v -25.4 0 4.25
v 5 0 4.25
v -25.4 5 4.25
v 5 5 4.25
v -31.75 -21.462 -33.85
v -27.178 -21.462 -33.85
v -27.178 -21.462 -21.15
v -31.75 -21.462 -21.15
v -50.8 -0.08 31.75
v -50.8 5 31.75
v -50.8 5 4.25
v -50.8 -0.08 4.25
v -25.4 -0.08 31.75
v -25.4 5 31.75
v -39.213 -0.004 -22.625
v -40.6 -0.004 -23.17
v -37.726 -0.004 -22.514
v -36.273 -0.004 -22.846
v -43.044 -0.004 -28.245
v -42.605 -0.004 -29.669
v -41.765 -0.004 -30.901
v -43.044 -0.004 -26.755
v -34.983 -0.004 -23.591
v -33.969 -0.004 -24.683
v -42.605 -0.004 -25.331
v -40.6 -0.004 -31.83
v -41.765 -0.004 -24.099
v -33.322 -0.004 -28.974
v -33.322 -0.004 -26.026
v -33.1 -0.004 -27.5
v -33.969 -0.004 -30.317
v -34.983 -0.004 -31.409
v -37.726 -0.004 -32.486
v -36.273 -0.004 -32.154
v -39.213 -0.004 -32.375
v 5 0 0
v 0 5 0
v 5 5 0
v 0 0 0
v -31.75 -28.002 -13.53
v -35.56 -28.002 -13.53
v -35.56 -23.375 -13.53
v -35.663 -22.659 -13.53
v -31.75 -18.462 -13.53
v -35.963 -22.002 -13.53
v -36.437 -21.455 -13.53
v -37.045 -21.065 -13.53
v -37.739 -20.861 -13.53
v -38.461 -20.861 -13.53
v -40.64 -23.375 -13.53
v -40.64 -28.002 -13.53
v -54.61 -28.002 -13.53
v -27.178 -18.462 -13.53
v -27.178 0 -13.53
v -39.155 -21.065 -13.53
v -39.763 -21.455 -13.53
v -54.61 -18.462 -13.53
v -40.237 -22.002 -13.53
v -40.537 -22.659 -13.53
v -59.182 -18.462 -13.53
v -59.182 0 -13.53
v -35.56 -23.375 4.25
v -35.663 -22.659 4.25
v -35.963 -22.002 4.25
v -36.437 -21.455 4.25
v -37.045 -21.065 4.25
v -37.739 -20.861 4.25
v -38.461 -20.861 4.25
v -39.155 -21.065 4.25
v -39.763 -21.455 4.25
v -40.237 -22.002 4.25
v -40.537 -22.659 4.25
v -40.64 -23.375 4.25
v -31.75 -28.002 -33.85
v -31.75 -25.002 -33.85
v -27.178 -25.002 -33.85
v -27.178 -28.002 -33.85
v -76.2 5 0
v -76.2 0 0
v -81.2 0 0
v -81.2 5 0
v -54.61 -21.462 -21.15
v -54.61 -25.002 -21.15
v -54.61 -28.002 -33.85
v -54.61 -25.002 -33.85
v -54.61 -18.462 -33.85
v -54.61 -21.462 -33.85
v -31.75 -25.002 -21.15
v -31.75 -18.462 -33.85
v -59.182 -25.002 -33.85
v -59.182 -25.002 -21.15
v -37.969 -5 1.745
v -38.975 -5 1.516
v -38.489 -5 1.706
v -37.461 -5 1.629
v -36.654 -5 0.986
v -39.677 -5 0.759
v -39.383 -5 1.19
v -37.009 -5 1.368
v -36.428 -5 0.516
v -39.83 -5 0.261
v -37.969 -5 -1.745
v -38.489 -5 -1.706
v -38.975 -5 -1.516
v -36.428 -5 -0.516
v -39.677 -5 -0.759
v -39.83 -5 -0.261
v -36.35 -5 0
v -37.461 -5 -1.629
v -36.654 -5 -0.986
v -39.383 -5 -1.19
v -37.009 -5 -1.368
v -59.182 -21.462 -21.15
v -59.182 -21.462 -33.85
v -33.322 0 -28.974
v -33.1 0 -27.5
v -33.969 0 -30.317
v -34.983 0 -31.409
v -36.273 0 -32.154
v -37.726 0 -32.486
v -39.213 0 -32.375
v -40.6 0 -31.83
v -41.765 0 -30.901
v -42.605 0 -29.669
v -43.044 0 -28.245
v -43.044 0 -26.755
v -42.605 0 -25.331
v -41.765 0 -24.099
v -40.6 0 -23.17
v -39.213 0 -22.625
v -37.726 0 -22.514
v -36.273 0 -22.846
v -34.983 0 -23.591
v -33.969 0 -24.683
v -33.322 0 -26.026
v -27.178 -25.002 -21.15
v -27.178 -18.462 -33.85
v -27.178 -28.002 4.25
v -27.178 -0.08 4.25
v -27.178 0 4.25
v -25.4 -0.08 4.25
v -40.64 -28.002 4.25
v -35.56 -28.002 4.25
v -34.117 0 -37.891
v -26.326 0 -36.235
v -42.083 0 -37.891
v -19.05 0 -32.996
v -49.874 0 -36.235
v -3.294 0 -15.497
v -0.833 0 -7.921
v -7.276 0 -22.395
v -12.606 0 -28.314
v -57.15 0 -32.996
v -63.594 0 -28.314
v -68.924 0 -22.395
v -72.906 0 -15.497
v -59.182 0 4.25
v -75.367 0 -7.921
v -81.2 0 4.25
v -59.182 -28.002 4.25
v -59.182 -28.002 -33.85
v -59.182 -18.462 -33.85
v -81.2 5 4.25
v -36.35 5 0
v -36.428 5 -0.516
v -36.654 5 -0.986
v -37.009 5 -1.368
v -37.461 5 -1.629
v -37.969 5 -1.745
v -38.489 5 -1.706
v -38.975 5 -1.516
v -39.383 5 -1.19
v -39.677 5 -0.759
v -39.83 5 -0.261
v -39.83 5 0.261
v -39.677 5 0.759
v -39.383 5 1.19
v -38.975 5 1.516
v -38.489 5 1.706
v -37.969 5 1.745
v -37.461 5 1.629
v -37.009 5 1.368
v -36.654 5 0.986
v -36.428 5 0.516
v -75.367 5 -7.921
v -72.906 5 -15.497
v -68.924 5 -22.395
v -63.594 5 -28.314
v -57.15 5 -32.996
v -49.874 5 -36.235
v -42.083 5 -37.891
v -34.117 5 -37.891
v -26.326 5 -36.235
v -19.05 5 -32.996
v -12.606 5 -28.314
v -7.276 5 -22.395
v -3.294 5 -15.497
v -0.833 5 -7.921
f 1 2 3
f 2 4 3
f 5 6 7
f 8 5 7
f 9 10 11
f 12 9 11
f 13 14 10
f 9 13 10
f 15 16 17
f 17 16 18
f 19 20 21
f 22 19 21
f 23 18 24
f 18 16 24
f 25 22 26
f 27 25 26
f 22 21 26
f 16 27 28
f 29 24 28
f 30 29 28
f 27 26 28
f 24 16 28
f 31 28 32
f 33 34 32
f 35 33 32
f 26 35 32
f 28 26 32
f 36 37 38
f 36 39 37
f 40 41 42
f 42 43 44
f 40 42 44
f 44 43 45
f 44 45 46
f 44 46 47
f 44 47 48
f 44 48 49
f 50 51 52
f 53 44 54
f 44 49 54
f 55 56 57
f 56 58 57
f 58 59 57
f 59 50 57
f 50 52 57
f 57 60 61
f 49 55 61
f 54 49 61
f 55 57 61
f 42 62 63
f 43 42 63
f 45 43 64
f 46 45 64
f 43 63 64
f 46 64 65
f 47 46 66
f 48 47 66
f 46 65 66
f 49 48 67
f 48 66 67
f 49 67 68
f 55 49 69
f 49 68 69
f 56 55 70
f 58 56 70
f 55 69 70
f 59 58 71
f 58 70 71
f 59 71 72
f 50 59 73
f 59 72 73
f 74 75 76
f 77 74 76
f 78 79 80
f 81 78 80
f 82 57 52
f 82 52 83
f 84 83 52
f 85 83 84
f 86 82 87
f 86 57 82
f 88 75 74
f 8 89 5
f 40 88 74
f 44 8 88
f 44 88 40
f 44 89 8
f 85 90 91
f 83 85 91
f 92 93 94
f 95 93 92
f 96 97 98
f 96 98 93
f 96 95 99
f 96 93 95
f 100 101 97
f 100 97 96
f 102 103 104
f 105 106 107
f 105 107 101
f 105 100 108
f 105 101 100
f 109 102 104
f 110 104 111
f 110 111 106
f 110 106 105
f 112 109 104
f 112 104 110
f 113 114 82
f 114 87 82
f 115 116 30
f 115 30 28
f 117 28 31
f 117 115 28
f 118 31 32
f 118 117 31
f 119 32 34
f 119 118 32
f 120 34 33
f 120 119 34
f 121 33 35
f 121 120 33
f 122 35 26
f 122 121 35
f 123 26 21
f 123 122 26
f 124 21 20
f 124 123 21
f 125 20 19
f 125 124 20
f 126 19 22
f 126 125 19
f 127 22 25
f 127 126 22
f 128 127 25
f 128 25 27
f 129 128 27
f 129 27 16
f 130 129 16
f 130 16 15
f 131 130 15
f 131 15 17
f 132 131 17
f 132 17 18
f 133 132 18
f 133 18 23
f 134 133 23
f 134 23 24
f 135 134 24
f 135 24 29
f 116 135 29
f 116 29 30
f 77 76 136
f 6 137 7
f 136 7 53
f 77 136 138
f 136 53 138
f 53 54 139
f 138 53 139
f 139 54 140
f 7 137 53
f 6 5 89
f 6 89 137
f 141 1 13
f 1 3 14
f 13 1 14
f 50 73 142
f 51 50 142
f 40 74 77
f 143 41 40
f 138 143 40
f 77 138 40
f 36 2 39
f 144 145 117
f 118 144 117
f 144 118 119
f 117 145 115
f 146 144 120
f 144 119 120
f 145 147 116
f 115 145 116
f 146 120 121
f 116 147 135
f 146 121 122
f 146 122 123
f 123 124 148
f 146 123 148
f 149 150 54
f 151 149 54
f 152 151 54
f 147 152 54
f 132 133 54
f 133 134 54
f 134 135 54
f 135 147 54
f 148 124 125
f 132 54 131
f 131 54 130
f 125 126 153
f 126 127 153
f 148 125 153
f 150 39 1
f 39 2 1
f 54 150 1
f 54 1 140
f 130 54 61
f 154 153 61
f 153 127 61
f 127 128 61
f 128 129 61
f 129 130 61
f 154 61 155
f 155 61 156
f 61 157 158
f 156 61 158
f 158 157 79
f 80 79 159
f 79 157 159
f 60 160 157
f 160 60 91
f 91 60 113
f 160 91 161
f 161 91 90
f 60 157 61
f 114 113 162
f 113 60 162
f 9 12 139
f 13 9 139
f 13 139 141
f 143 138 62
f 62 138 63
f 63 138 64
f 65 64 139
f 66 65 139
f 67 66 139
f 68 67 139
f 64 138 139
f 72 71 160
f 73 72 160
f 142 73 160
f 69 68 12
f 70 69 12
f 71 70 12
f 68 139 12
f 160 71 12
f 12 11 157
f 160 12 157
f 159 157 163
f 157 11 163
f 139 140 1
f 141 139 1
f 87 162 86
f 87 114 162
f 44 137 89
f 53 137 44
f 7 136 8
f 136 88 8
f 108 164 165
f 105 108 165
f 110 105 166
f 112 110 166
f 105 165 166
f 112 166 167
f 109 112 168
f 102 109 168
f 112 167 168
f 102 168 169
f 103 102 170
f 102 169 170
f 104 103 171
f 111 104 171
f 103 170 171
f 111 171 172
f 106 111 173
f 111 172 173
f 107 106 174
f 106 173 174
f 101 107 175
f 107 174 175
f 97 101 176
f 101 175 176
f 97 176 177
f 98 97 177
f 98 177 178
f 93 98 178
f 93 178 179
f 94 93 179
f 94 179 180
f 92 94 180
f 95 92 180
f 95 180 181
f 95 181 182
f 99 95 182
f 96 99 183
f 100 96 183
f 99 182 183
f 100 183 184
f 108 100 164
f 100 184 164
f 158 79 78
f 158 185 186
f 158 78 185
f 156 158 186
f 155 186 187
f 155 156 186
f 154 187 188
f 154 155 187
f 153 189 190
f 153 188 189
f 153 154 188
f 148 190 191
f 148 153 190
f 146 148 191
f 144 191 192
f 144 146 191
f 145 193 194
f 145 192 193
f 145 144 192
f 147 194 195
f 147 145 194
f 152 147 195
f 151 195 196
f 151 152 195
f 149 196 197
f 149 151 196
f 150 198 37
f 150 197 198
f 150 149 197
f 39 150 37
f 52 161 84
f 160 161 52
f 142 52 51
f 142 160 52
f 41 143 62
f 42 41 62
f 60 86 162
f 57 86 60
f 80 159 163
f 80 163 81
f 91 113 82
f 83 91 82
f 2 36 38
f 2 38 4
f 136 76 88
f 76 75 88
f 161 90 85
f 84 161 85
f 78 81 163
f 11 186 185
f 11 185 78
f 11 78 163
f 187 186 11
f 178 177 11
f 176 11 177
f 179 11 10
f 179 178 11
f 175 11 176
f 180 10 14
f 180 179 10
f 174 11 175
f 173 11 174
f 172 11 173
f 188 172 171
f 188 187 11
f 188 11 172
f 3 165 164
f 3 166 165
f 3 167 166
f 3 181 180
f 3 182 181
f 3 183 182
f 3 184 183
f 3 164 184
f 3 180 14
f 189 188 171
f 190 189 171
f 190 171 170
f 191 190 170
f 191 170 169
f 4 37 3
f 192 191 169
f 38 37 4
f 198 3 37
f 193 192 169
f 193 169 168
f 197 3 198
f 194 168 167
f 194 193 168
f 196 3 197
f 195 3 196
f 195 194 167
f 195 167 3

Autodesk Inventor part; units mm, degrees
sketch "Sketch1" plane through (0, 0, 0) normal (0, 1, 0) x (-1, 0, 0)
  line L0 (0, 0) -> (0, 114.3)
  line L1 (0, 114.3) -> (76.2, 114.3)
  line L2 (76.2, 114.3) -> (76.2, 0)
  line L3 (76.2, 0) -> (0, 0)
  circle A0 centre (38.1, 0) radius 38.1
  dimension "d0" = 114.3
  dimension "d1" = 76.2
extrude "Extrusion1" add sketch "Sketch1" along normal blind 5
sketch "Sketch2" plane through (0, 0, 0) normal (0, -1, 0) x (1, 0, 0)
  line L0 (-27.94, 89.7) -> (-27.94, 77) projected
  line L1 (-48.26, 51.6) -> (-48.26, 64.3) projected
  line L2 (-48.26, 51.6) -> (-48.26, 49.6)
  line L3 (-53.34, 64.3) -> (-48.26, 64.3)
  line L4 (-48.26, 64.3) -> (-48.26, 66.3)
  line L5 (-27.94, 66.3) -> (-27.94, 49.6)
  line L6 (-48.26, 70.015) -> (-48.26, 45.885) projected
  line L7 (-48.26, 70.015) -> (-48.26, 45.885)
  line L8 (-48.26, 42.885) -> (-27.94, 42.885)
  line L9 (-27.94, 42.885) -> (-27.94, 72.015)
  line L10 (-27.94, 72.015) -> (-27.94, 73.015)
  line L11 (-27.94, 73.015) -> (-48.26, 73.015)
  line L12 (-48.26, 42.885) -> (-49.26, 42.885)
  line L13 (-49.0223, 73.0219) -> (-48.26, 73.015)
  line L14 (-27.94, 73.015) -> (-49.26, 73.015)
  line L15 (-49.26, 73.015) -> (-49.26, 42.885)
  line L16 (-49.26, 42.885) -> (-27.94, 42.885)
  line L17 (-27.94, 42.885) -> (-27.94, 73.015)
  point P0 (0, 0)
  dimension "d5" = 2
  dimension "d12" = 2
  dimension "d69" = 3
  dimension "d70" = 3
  dimension "d75" = 1
extrude "Extrusion2" cut sketch "Sketch2" against normal blind 25.4
sketch "Sketch3" plane through (0, 0, 0) normal (0, -1, 0) x (1, 0, 0)
  arc A0 (-76.2, 0) -> (0, 0) centre (-38.1, 0) ccw projected
  line L0 (-38.1, 0) -> (-38.1, -27.5)
  circle A1 centre (-38.1, -27.5) radius 5
  dimension "d8" = 27.5
  dimension "d9" = 10
extrude "Extrusion3" cut sketch "Sketch3" against normal blind 25.4
sketch "Sketch5" plane through (-76.2, 0, 114.3) normal (0, 0, 1) x (1, 0, 0)
  circle A0 centre (38.1, -23.375) radius 3.275 projected
  line L0 (47.85, -18.65) -> (28.35, -18.65) projected
  line L1 (28.35, -28.1) -> (47.85, -28.1) projected
  line L2 (28.35, -18.65) -> (28.35, -28.1) projected
  line L3 (47.85, -28.1) -> (47.85, -18.65) projected
  line L4 (76.2, 5) -> (0, 5) projected
  line L5 (38.1, 5) -> (38.1, -18.65)
  line L6 (38.1, -18.65) -> (47.85, -18.65)
  line L7 (47.85, -18.65) -> (48.1, -18.65)
  line L8 (48.1, -18.65) -> (48.1, -28.1)
  line L9 (48.1, -28.1) -> (52.1, -28.1)
  line L10 (52.1, -28.1) -> (52.1, -18.65)
  line L11 (52.1, -18.65) -> (52.1, -16.65)
  line L12 (52.1, -16.65) -> (52.1, 0)
  line L13 (0, 0) -> (76.2, 0) projected
  line L14 (38.1, -18.65) -> (28.35, -18.65)
  line L15 (28.35, -18.65) -> (28.1, -18.65)
  line L16 (28.1, -18.65) -> (28.1, -28.1)
  line L17 (28.1, -28.1) -> (24.1, -28.1)
  line L18 (24.1, -28.1) -> (24.1, 0)
  line L19 (52.1, 0) -> (24.1, 0)
  dimension "d23" = 0.25
  dimension "d24" = 4
  dimension "d25" = 2
  dimension "d26" = 0.25
  dimension "d27" = 4
extrude "Extrusion5" add sketch "Sketch5" against normal blind 3 contours L0 L5 L13 L12 L11 L10 L9 L8 L7 | L0 L15 L16 L17 L18 L13 L5
ref_plane "Work Plane1" through (-76.2, 0, 79.55) normal (0, 0, -1) x (-1, 0, 0)
sketch "Sketch6" plane through (-76.2, 0, 79.55) normal (0, 0, -1) x (-1, 0, 0)
  circle A0 centre (-38.1, -23.375) radius 3.275 projected
  line L0 (-34.825, -23.375) -> (-30.825, -23.375)
  line L1 (-48.1, -18.65) -> (-28.1, -18.65) projected
  line L2 (-30.825, -23.375) -> (-30.825, 0)
  line L3 (-41.375, -23.375) -> (-45.375, -23.375)
  line L4 (0, 5) -> (-76.2, 5) projected
  line L5 (-45.375, -23.375) -> (-45.375, 0)
  line L6 (-45.375, 0) -> (-30.825, 0)
  circle A1 centre (-38.1, -23.375) radius 3.275
  point P0 (-76.2, 0)
  dimension "d31" = 4
  dimension "d32" = 4
extrude "Extrusion6" add sketch "Sketch6" along normal blind 3 contours A0 L3 L5 L1 L2 L0 | L1 L5 L6 L2
sketch "Sketch9" plane through (0, 0, 0) normal (0, -1, 0) x (1, 0, 0)
  line L0 (-45.375, 79.55) -> (-45.375, 76.55) projected
  line L1 (-44.442, 86.368) -> (-46.442, 86.368) projected
  line L2 (-46.442, 86.368) -> (-46.442, 79.796) projected
  line L3 (-46.442, 79.796) -> (-38.902, 79.796) projected
  line L4 (-38.902, 79.796) -> (-38.902, 86.368) projected
  line L5 (-38.902, 86.368) -> (-40.902, 86.368) projected
  line L6 (-40.902, 86.368) -> (-40.902, 81.796) projected
  line L7 (-40.902, 81.796) -> (-44.442, 81.796) projected
  line L8 (-44.442, 81.796) -> (-44.442, 86.368) projected
  line L9 (-41.375, 79.55) -> (-45.375, 79.55) projected
  line L10 (-45.375, 79.55) -> (-45.375, 76.55) projected
  line L11 (-41.375, 76.55) -> (-45.375, 76.55) projected
  line L12 (-41.375, 79.55) -> (-41.375, 76.55) projected
  line L13 (-45.375, 76.55) -> (-45.375, 79.55) projected
  line L14 (-46.442, 79.796) -> (-45.375, 79.796)
  line L15 (-45.375, 79.796) -> (-45.375, 76.55)
  line L16 (-45.375, 76.55) -> (-46.442, 76.55)
  line L17 (-46.442, 76.55) -> (-46.442, 79.796)
  line L18 (-38.902, 86.368) -> (-38.902, 79.796) projected
  line L19 (-38.902, 79.796) -> (-45.375, 79.796)
  line L20 (-45.375, 79.796) -> (-45.375, 79.55)
  line L21 (-45.375, 79.55) -> (-38.902, 79.55)
  line L22 (-38.902, 79.55) -> (-38.902, 79.796)
  point P0 (0, 0)
extrude "Extrusion9" add sketch "Sketch9" along normal blind 23.37 contours L15 L3 L22 L21 L9 | L0 L16 L17 L3 L15
sketch "Sketch14" plane through (0, 0, 0) normal (0, -1, 0) x (1, 0, 0)
  line L0 (0, 0) -> (5, 0)
  line L1 (5, 0) -> (5, 114.3)
  line L2 (5, 114.3) -> (5, 119.3)
  line L3 (5, 119.3) -> (-76.2, 119.3)
  line L4 (-52.1, 114.3) -> (-76.2, 114.3) projected
  line L5 (-76.2, 119.3) -> (-81.2, 119.3)
  line L6 (-81.2, 119.3) -> (-81.2, 0)
  line L7 (-76.2, 0) -> (-81.2, 0)
  line L8 (-81.2, 0) -> (-81.2, 119.3)
  line L9 (-81.2, 119.3) -> (-76.2, 119.3)
  line L10 (-76.2, 119.3) -> (-76.2, 0)
  line L11 (-81.2, 119.3) -> (5, 119.3)
  line L12 (5, 119.3) -> (5, 114.3)
  line L13 (5, 114.3) -> (-81.2, 114.3)
  line L14 (-81.2, 114.3) -> (-81.2, 119.3)
  line L15 (5, 119.3) -> (0, 119.3)
  line L16 (0, 119.3) -> (0, 0)
  line L17 (0, 0) -> (5, 0)
  line L18 (5, 0) -> (5, 119.3)
  dimension "d58" = 5
  dimension "d59" = 5
  dimension "d60" = 5
extrude "Extrusion14" add sketch "Sketch14" against normal blind 5
sketch "Sketch15" plane through (-38.902, -23.37, 79.55) normal (0, 0, -1) x (-1, 0, 0)
  arc A0 (2.473, -0.005) -> (-4.077, -0.005) centre (-0.802, -0.005) ccw projected
  circle A1 centre (-0.802, -0.005) radius 3.275
  point P0 (-38.902, 23.37)
extrude "Extrusion15" cut sketch "Sketch15" against normal blind 25.4
ref_plane "Work Plane2" through (-29.1001, -34.45, 98.298) normal (1, 0, 0) x (0, -1, 0)
sketch "Sketch16" plane through (-29.1001, -34.45, 98.298) normal (1, 0, 0) x (0, -1, 0)
  line L0 (-5.08, 11.43) -> (5.08, 11.43) projected
  arc A0 (-5.08, 11.43) -> (-6.35, 10.16) centre (-5.08, 10.16) ccw projected
  line L1 (-6.35, -10.16) -> (-6.35, 10.16) projected
  arc A1 (-6.35, -10.16) -> (-5.08, -11.43) centre (-5.08, -10.16) ccw projected
  line L2 (5.08, -11.43) -> (-5.08, -11.43) projected
  arc A2 (5.08, -11.43) -> (6.35, -10.16) centre (5.08, -10.16) ccw projected
  line L3 (6.35, 10.16) -> (6.35, -10.16) projected
  arc A3 (6.35, 10.16) -> (5.08, 11.43) centre (5.08, 10.16) ccw projected
  line L4 (0, 11.43) -> (-6.35, 11.43)
  line L5 (-6.35, 11.43) -> (-6.35, -11.43)
  line L6 (-6.35, -11.43) -> (0, -11.43)
  line L7 (0, -11.43) -> (0, 11.43)
  line L8 (-34.45, -21.002) -> (-34.45, 98.298) projected
  line L9 (-6.35, 11.43) -> (-34.45, 11.43)
  line L10 (-34.45, 11.43) -> (-34.45, -11.43)
  line L11 (-34.45, -11.43) -> (-6.35, -11.43)
  line L12 (-6.35, -11.43) -> (-6.35, 11.43)
extrude "Extrusion16" add sketch "Sketch16" along normal blind 3 contours L0 L7 L2 A1 L1 A0 | A0 L5 L4 | L1 L5 L11 L8 L9 | A1 L6 L5
sketch "Sketch17" plane through (-29.1001, -34.45, 98.298) normal (-1, 0, 0) x (0, 0, 1)
  line L0 (10.16, 6.35) -> (-10.16, 6.35) projected
  line L1 (11.43, 34.45) -> (11.43, 0) projected
  line L2 (11.43, 34.45) -> (-11.43, 34.45) projected
  line L3 (11.43, 6.35) -> (-11.43, 6.35)
  line L4 (-11.43, 6.35) -> (-11.43, 34.45)
  line L5 (-11.43, 34.45) -> (11.43, 34.45)
  line L6 (11.43, 34.45) -> (11.43, 6.35)
  point P0 (-98.298, 34.45)
extrude "Extrusion17" add sketch "Sketch17" along normal blind 5
sketch "Sketch18" plane through (0, 0, 0) normal (0, -1, 0) x (1, 0, 0)
  line L0 (-76.2, 64.3) -> (-60.198, 64.3) projected
  line L1 (-70.866, 64.3) -> (-71.882, 64.3) projected
  line L2 (-70.866, 64.3) -> (-70.866, 66.84) projected
  line L3 (-71.882, 66.84) -> (-70.866, 66.84) projected
  line L4 (-76.2, 63.03) -> (-76.2, 64.3) projected
  line L5 (-76.2, 63.03) -> (-76.2, 42.71) projected
  line L6 (-76.2, 41.44) -> (-76.2, 42.71) projected
  line L7 (-76.2, 41.44) -> (-60.198, 41.44) projected
  line L8 (-60.198, 36.868) -> (-60.198, 42.71) projected
  line L9 (-57.658, 36.868) -> (-60.198, 36.868) projected
  line L10 (-57.658, 36.868) -> (-57.658, 42.71) projected
  line L11 (-57.658, 41.44) -> (-53.34, 41.44) projected
  line L12 (-53.34, 57.95) -> (-53.34, 42.71) projected
  line L13 (-53.34, 41.44) -> (-53.34, 42.71) projected
  line L14 (-53.34, 51.6) -> (-48.26, 51.6)
  line L15 (-53.34, 64.3) -> (-48.26, 64.3)
  line L16 (-57.658, 64.3) -> (-53.34, 64.3) projected
  line L17 (-57.658, 63.03) -> (-57.658, 68.872) projected
  line L18 (-60.198, 63.03) -> (-60.198, 68.872) projected
  line L19 (-57.658, 68.872) -> (-60.198, 68.872) projected
  line L20 (-48.26, 70.015) -> (-48.26, 45.885) projected
  line L21 (-76.2, 64.3) -> (-53.34, 64.3)
  line L22 (-53.34, 64.3) -> (-53.34, 41.44)
  line L23 (-53.34, 41.44) -> (-76.2, 41.44)
  line L24 (-76.2, 41.44) -> (-76.2, 64.3)
  line L25 (-57.658, 68.872) -> (-60.198, 68.872)
  line L26 (-60.198, 68.872) -> (-60.198, 64.3)
  line L27 (-60.198, 64.3) -> (-57.658, 64.3)
  line L28 (-57.658, 64.3) -> (-57.658, 68.872)
  line L29 (-60.198, 41.44) -> (-57.658, 41.44)
  line L30 (-57.658, 41.44) -> (-57.658, 36.868)
  line L31 (-57.658, 36.868) -> (-60.198, 36.868)
  line L32 (-60.198, 36.868) -> (-60.198, 41.44)
  line L33 (-71.882, 64.3) -> (-70.866, 64.3)
  line L34 (-70.866, 64.3) -> (-70.866, 66.84)
  line L35 (-53.34, 64.3) -> (-48.26, 64.3)
  line L36 (-48.26, 64.3) -> (-48.26, 51.6)
  line L37 (-48.26, 51.6) -> (-53.34, 51.6)
  line L38 (-53.34, 51.6) -> (-53.34, 64.3)
  line L39 (-70.866, 64.3) -> (-70.366, 64.3)
  line L40 (-70.366, 64.3) -> (-71.882, 64.3)
  line L41 (-71.882, 64.3) -> (-72.382, 64.3)
  line L42 (-70.366, 64.3) -> (-72.382, 64.3)
  line L43 (-72.382, 64.3) -> (-72.382, 72.555)
  line L44 (-72.382, 72.555) -> (-70.366, 72.555)
  line L45 (-70.366, 72.555) -> (-70.366, 64.3)
  line L46 (-60.698, 69.372) -> (-57.158, 69.372) projected
  line L47 (-60.698, 64.3) -> (-57.158, 64.3)
  line L48 (-57.158, 64.3) -> (-57.158, 69.372)
  line L49 (-57.158, 69.372) -> (-60.698, 69.372)
  line L50 (-60.698, 69.372) -> (-60.698, 64.3)
  line L51 (-60.698, 41.44) -> (-57.158, 41.44)
  line L52 (-57.158, 41.44) -> (-57.158, 36.368)
  line L53 (-57.158, 36.368) -> (-60.698, 36.368)
  line L54 (-60.698, 36.368) -> (-60.698, 41.44)
  point P0 (0, 0)
  dimension "d111" = 0.5
  dimension "d112" = 0.5
  dimension "d113" = 8.255
extrude "Extrusion18" cut sketch "Sketch18" against normal blind 5
ref_plane "Work Plane3" through (-51.9601, -34.45, 98.306) normal (-1, 0, 0) x (0, -1, 0)
sketch "Sketch20" plane through (-51.9601, -34.45, 98.306) normal (-1, 0, 0) x (0, -1, 0)
  arc A0 (-6.35, 5.08) -> (6.35, 5.08) centre (0, 5.08) ccw projected
  line L0 (-6.35, 5.08) -> (-6.35, -10.16) projected
  arc A1 (-6.35, -10.16) -> (-5.08, -11.43) centre (-5.08, -10.16) ccw projected
  line L1 (-5.08, -11.43) -> (5.08, -11.43) projected
  arc A2 (5.08, -11.43) -> (6.35, -10.16) centre (5.08, -10.16) ccw projected
  line L2 (6.35, -10.16) -> (6.35, 5.08) projected
  line L3 (-6.35, -11.43) -> (-2.2139, -11.43)
  line L4 (-2.2139, -2.54) -> (-6.35, -2.54)
  line L5 (-6.35, -2.54) -> (-6.35, -11.43)
  line L6 (-6.35, -2.54) -> (-1.27, -2.54)
  line L7 (-1.27, -2.54) -> (-1.27, -11.43)
  line L8 (-6.35, -11.43) -> (-1.27, -11.43)
  line L9 (-1.27, -11.43) -> (-1.27, -2.54)
  line L10 (-1.27, -2.54) -> (-6.35, -2.54)
  line L11 (-6.35, -2.54) -> (-6.35, -11.43)
  point P0 (-34.45, -98.306)
  dimension "d76" = 8.89
  dimension "d77" = 4.1361
  dimension "d78" = 5.08
extrude "Extrusion20" add sketch "Sketch20" along normal blind 2 contours L4 L6 L7 L1 A1 L0 | A1 L3 L5
sketch "Sketch21" plane through (-53.9601, -34.45, 98.306) normal (-1, 0, 0) x (0, 0, 1)
  line L0 (-2.54, 6.35) -> (-11.43, 6.35) projected
  line L1 (-11.438, 0) -> (-11.438, 34.45) projected
  line L2 (-2.54, 6.35) -> (-11.438, 6.35)
  line L3 (-11.438, 6.35) -> (-11.438, 34.45)
  line L4 (-11.438, 34.45) -> (-2.54, 34.45)
  line L5 (-2.54, 34.45) -> (-2.54, 6.35)
  point P0 (-98.306, 34.45)
extrude "Extrusion21" add sketch "Sketch21" against normal blind 5
ref_plane "Work Plane4" through (-71.904, -22.7, 83.386) normal (0, 0, 1) x (-1, 0, 0)
ref_plane "Work Plane5" through (-43.18, -24.002, -27.5) normal (0, -1, 0) x (0, 0, -1)
sketch "Sketch23" plane through (-43.18, -24.002, -27.5) normal (0, -1, 0) x (0, 0, -1)
  circle A0 centre (0, 12.7) radius 1.016 projected
  arc A1 (-5.08, 11.43) -> (-6.35, 10.16) centre (-5.08, 10.16) ccw projected
  line L0 (5.08, 11.43) -> (-5.08, 11.43) projected
  arc A2 (6.35, 10.16) -> (5.08, 11.43) centre (5.08, 10.16) ccw projected
  line L1 (6.35, 10.16) -> (6.35, 16.002) projected
  line L2 (6.35, 16.002) -> (-6.35, 16.002) projected
  line L3 (-6.35, 16.002) -> (-6.35, 10.16) projected
  arc A3 (-6.35, -10.16) -> (-5.08, -11.43) centre (-5.08, -10.16) ccw projected
  line L4 (-6.35, -10.16) -> (-6.35, -16.002) projected
  line L5 (-6.35, -16.002) -> (6.35, -16.002) projected
  line L6 (6.35, -16.002) -> (6.35, -10.16) projected
  arc A4 (5.08, -11.43) -> (6.35, -10.16) centre (5.08, -10.16) ccw projected
  line L7 (-5.08, -11.43) -> (5.08, -11.43) projected
  circle A5 centre (0, -12.7) radius 1.016 projected
  line L8 (6.35, 11.43) -> (-6.35, 11.43)
  line L9 (-6.35, 11.43) -> (-6.35, 16.002)
  line L10 (-6.35, 16.002) -> (6.35, 16.002)
  line L11 (6.35, 16.002) -> (6.35, 11.43)
  circle A6 centre (0, 12.7) radius 1.016
  line L12 (-6.35, -11.43) -> (6.35, -11.43)
  line L13 (6.35, -11.43) -> (6.35, -16.002)
  line L14 (6.35, -16.002) -> (-6.35, -16.002)
  line L15 (-6.35, -16.002) -> (-6.35, -11.43)
  circle A7 centre (0, -12.7) radius 1.016
  line L16 (6.35, 11.43) -> (-31.75, 11.43)
  line L17 (-31.75, 11.43) -> (-31.75, 16.002)
  line L18 (-31.75, 16.002) -> (6.35, 16.002)
  line L19 (6.35, 16.002) -> (6.35, 11.43)
  line L20 (6.35, -16.002) -> (-31.75, -16.002)
  line L21 (-31.75, -16.002) -> (-31.75, -11.43)
  line L22 (-31.75, -11.43) -> (6.35, -11.43)
  line L23 (6.35, -11.43) -> (6.35, -16.002)
  point P0 (-27.5, 43.18)
  dimension "d89" = 38.1
  dimension "d90" = 38.1
extrude "Extrusion23" add sketch "Sketch23" along normal blind 3 contours A0 | L8 L3 L2 L1 L0 | L16 L17 L18 L3 | L7 L12 L6 L5 L4 | L4 L20 L21 L22 | A5
sketch "Sketch24" plane through (-59.182, -24.002, -33.85) normal (-1, 0, 0) x (0, 0, 1)
  line L0 (38.1, 0) -> (38.1, -3) projected
  line L1 (-4.25, 24.002) -> (33.85, 24.002) projected
  line L2 (38.1, -3) -> (20.32, -3)
  line L3 (20.32, -3) -> (20.32, 24.002)
  line L4 (20.32, 24.002) -> (38.1, 24.002)
  line L5 (38.1, 24.002) -> (38.1, -3)
  dimension "d93" = 17.78
extrude "Extrusion24" add sketch "Sketch24" against normal blind 32.004
ref_plane "Work Plane6" through (-43.18, -21.462, -27.5) normal (0, 1, 0) x (0, 0, 1)
sketch "Sketch25" plane through (-43.18, -21.462, -27.5) normal (0, 1, 0) x (0, 0, 1)
  arc A0 (5.08, -11.43) -> (6.35, -10.16) centre (5.08, -10.16) ccw projected
  line L0 (-5.08, -11.43) -> (5.08, -11.43) projected
  arc A1 (-6.35, -10.16) -> (-5.08, -11.43) centre (-5.08, -10.16) ccw projected
  line L1 (-6.35, -16.002) -> (-6.35, -10.16) projected
  line L2 (6.35, -16.002) -> (-6.35, -16.002) projected
  line L3 (6.35, -10.16) -> (6.35, -16.002) projected
  circle A2 centre (0, -12.7) radius 1.016 projected
  arc A3 (6.35, 10.16) -> (5.08, 11.43) centre (5.08, 10.16) ccw projected
  line L4 (6.35, 16.002) -> (6.35, 10.16) projected
  line L5 (-6.35, 16.002) -> (6.35, 16.002) projected
  line L6 (-6.35, 10.16) -> (-6.35, 16.002) projected
  arc A4 (-5.08, 11.43) -> (-6.35, 10.16) centre (-5.08, 10.16) ccw projected
  line L7 (5.08, 11.43) -> (-5.08, 11.43) projected
  circle A5 centre (0, 12.7) radius 1.016 projected
  line L8 (31.75, 16.002) -> (13.97, 16.002) projected
  line L9 (-6.35, 11.43) -> (22.86, 11.43)
  line L10 (22.86, 11.43) -> (22.86, 16.002)
  line L11 (22.86, 16.002) -> (-6.35, 16.002)
  line L12 (-6.35, 16.002) -> (-6.35, 11.43)
  circle A6 centre (0, 12.7) radius 1.016
  line L13 (-6.35, -11.43) -> (13.97, -11.43)
  line L14 (13.97, -11.43) -> (13.97, -16.002)
  line L15 (13.97, -16.002) -> (-6.35, -16.002)
  line L16 (-6.35, -16.002) -> (-6.35, -11.43)
  circle A7 centre (0, -12.7) radius 1.016
  point P0 (27.5, 43.18)
extrude "Extrusion25" add sketch "Sketch25" along normal blind 3 contours L13 L3 L2 L1 L0 | L13 L14 L15 L3 | A2 | L7 L9 L6 L5 L4 | L4 L11 L8 L10 L9 | A5
sketch "Sketch26" plane through (-43.18, -21.462, -27.5) normal (0, -1, 0) x (1, 0, 0)
  line L0 (16.002, 6.35) -> (10.16, 6.35) projected
  line L1 (-16.002, -6.35) -> (-16.002, 13.97) projected
  line L2 (-16.002, 13.97) -> (-11.43, 13.97) projected
  line L3 (-16.002, 6.35) -> (-13.716, 6.35)
  line L4 (-13.716, 6.35) -> (-13.716, 13.97)
  line L5 (-13.716, 13.97) -> (-16.002, 13.97)
  line L6 (-16.002, 13.97) -> (-16.002, 6.35)
  line L7 (-13.716, 13.97) -> (-11.8721, 13.97)
  line L8 (-11.8721, 6.35) -> (-13.716, 6.35)
  line L9 (-13.716, 6.35) -> (-13.716, 13.97)
  line L10 (11.43, 13.97) -> (16.002, 13.97) projected
  line L11 (11.43, 6.35) -> (16.002, 6.35)
  line L12 (16.002, 6.35) -> (16.002, 13.97)
  line L13 (16.002, 13.97) -> (11.43, 13.97)
  line L14 (11.43, 13.97) -> (11.43, 6.35)
  line L15 (-11.43, 13.97) -> (-11.43, -6.35) projected
  line L16 (-11.43, 6.35) -> (-13.716, 6.35)
  line L17 (-13.716, 6.35) -> (-13.716, 13.97)
  line L18 (-13.716, 13.97) -> (-11.43, 13.97)
  line L19 (-11.43, 13.97) -> (-11.43, 6.35)
  point P0 (43.18, 27.5)
extrude "Extrusion26" add sketch "Sketch26" along normal blind 3
sketch "Sketch28" plane through (0, 0, 0) normal (0, -1, 0) x (1, 0, 0)
  line L0 (-81.2, 119.3) -> (-81.2, 93.9)
  line L1 (-81.2, 119.3) -> (-81.2, 0) projected
  line L2 (-81.2, 93.9) -> (-78.2, 93.9)
  line L3 (-78.2, 93.9) -> (-78.2, 81.2)
  line L4 (-78.2, 81.2) -> (-81.2, 81.2)
  line L5 (-81.2, 93.9) -> (-81.2, 81.2)
  line L6 (-81.2, 0) -> (-76.2, 0) projected
  line L7 (-81.2, 0) -> (-81.2, 25.4)
  line L8 (-81.2, 25.4) -> (-78.2, 25.4)
  line L9 (-78.2, 25.4) -> (-78.2, 38.1)
  line L10 (-78.2, 38.1) -> (-81.2, 38.1)
  line L11 (-81.2, 25.4) -> (-81.2, 38.1)
  line L12 (5, 119.3) -> (-81.2, 119.3) projected
  line L13 (-38.1, 119.3) -> (-38.1, 128.3765)
  line L14 (5, 119.3) -> (5, 93.9)
  line L15 (5, 119.3) -> (5, 0)
  line L16 (5, 93.9) -> (2, 93.9)
  line L17 (2, 93.9) -> (2, 81.2)
  line L18 (2, 81.2) -> (5, 81.2)
  line L19 (5, 93.9) -> (5, 81.2)
  line L20 (5, 0) -> (5, 25.4)
  line L21 (5, 25.4) -> (2, 25.4)
  line L22 (2, 25.4) -> (2, 38.1)
  line L23 (2, 38.1) -> (5, 38.1)
  line L24 (5, 25.4) -> (5, 38.1)
  point P0 (0, 0)
  dimension "d104" = 25.4
  dimension "d105" = 3
  dimension "d106" = 12.7
  dimension "d107" = 25.4
  dimension "d108" = 12.7
extrude "Extrusion27" cut sketch "Sketch28" against normal blind 254
sketch "Sketch29" plane through (0, 5, 0) normal (0, 1, 0) x (1, 0, 0)
  circle A0 centre (-38.1, 27.5) radius 5 projected
  circle A1 centre (-38.1, 27.5) radius 5
  point P0 (0, 0)
extrude "Extrusion28" add sketch "Sketch29" against normal blind 5.0038
sketch "Sketch30" plane through (0, 0, 0) normal (0, -1, 0) x (1, 0, 0)
  line L0 (-25.7555, 33.65) -> (-0.7555, 33.65) projected
  line L1 (-0.7555, 33.65) -> (-0.7555, 85.65) projected
  line L2 (-0.7555, 85.65) -> (-25.7555, 85.65) projected
  line L3 (-25.7555, 85.65) -> (-25.7555, 33.65) projected
  line L4 (-27.94, 42.885) -> (-25.7555, 42.885)
  line L5 (-25.7555, 42.885) -> (-25.7555, 69.015)
  line L6 (-25.7555, 69.015) -> (-27.94, 69.015)
  line L7 (-27.94, 69.015) -> (-27.94, 42.885)
  line L8 (-25.7555, 85.65) -> (-20.7555, 85.65)
  line L9 (-0.7555, 85.65) -> (-5.7555, 85.65)
  line L10 (-20.7555, 85.65) -> (-5.7555, 85.65)
  line L11 (-5.7555, 85.65) -> (-5.7555, 88.65)
  line L12 (-5.7555, 88.65) -> (-20.7555, 88.65)
  line L13 (-20.7555, 88.65) -> (-20.7555, 85.65)
  point P0 (0, 0)
  dimension "d116" = 5
  dimension "d117" = 5
  dimension "d118" = 3
extrude "Extrusion29" add sketch "Sketch30" along normal blind 5 contours L4 L7 L6 L3 | L2 L13 L12 L11
sketch "Sketch31" plane through (-24.1, -28.1, 114.3) normal (1, 0, 0) x (0, 0, -1)
  line L0 (0, 0) -> (0, 9.45) projected
  line L1 (4.572, 28.1) -> (4.572, -6.35) projected
  line L2 (0, 0) -> (4.572, 0)
  line L3 (4.572, 0) -> (4.572, 28.1)
  line L4 (4.572, 28.1) -> (0, 28.1)
  line L5 (0, 28.1) -> (0, 0)
  point P0 (114.3, 28.1)
extrude "Extrusion30" add sketch "Sketch31" against normal blind 4
sketch "Sketch32" plane through (0, 0, 0) normal (0, -1, 0) x (1, 0, 0)
  line L0 (-57.158, 69.372) -> (-57.158, 64.3) projected
  line L1 (-57.158, 69.372) -> (-70.366, 69.372)
  line L2 (-70.366, 69.372) -> (-70.366, 36.368)
  line L3 (-70.366, 36.368) -> (-57.158, 36.368)
  line L4 (-57.158, 36.368) -> (-57.158, 69.372)
  point P0 (0, 0)
extrude "Extrusion31" add sketch "Sketch32" along normal blind 2.54
sketch "Sketch35" plane through (-59.182, -27.002, 4.25) normal (0, 0, 1) x (1, 0, 0)
  circle A0 centre (21.082, 3.627) radius 1.9 projected
  circle A1 centre (21.082, 3.627) radius 1.9
  circle A2 centre (21.082, 3.627) radius 1.9
  line L0 (32.004, 0) -> (0, 0) projected
  line L1 (22.982, 0) -> (19.182, 0)
  line L2 (22.982, 0) -> (21.082, 0)
  line L3 (21.082, 0) -> (21.082, 3.627)
  line L4 (21.082, 3.627) -> (22.982, 3.627)
  line L5 (22.982, 3.627) -> (22.982, 0)
  line L6 (21.082, 3.627) -> (19.182, 3.627)
  line L7 (19.182, 3.627) -> (19.182, 0)
  line L8 (19.182, 0) -> (21.082, 0)
  line L9 (21.082, 0) -> (21.082, 3.627)
  point P0 (59.182, 27.002)
extrude "Extrusion34" cut sketch "Sketch35" against normal blind 25.4
sketch "Sketch36" plane through (0, 5, 0) normal (0, 1, 0) x (1, 0, 0)
  line L0 (-81.2, -119.3) -> (5, -119.3) projected
  line L1 (-81.2, -119.3) -> (-68.5, -119.3)
  line L2 (5, -119.3) -> (-7.7, -119.3)
  line L3 (-5.7555, -88.65) -> (-20.7555, -88.65) projected
  line L4 (-68.5, -119.3) -> (-7.7, -119.3)
  line L5 (-7.7, -119.3) -> (-7.7, -88.65)
  line L6 (-7.7, -88.65) -> (-68.5, -88.65)
  line L7 (-68.5, -88.65) -> (-68.5, -119.3)
  line L8 (-52.1, -111.3) -> (-52.1, -114.3) projected
  line L9 (-24.1, -114.3) -> (-24.1, -109.728) projected
  line L10 (-52.1, -119.3) -> (-68.5, -119.3)
  line L11 (-68.5, -119.3) -> (-68.5, -88.65)
  line L12 (-68.5, -88.65) -> (-52.1, -88.65)
  line L13 (-52.1, -88.65) -> (-52.1, -119.3)
  line L14 (-24.1, -119.3) -> (-7.7, -119.3)
  line L15 (-7.7, -119.3) -> (-7.7, -88.65)
  line L16 (-7.7, -88.65) -> (-24.1, -88.65)
  line L17 (-24.1, -88.65) -> (-24.1, -119.3)
  point P0 (0, 0)
  dimension "d134" = 12.7
  dimension "d135" = 12.7
sketch "Sketch37" plane through (0, 0, 0) normal (0, -1, 0) x (1, 0, 0)
  line L0 (-29.1001, 88.146) -> (-45.1021, 88.146) projected
  line L1 (-29.1001, 88.146) -> (-29.1001, 108.466) projected
  line L2 (-29.1001, 108.466) -> (-45.1021, 108.466) projected
  line L3 (-45.1021, 114.308) -> (-45.1021, 108.466) projected
  line L4 (-47.6421, 114.308) -> (-45.1021, 114.308) projected
  line L5 (-47.6421, 114.308) -> (-47.6421, 108.466) projected
  line L6 (-47.6421, 108.466) -> (-51.9601, 108.466) projected
  line L7 (-51.9601, 103.386) -> (-51.9601, 108.466) projected
  line L8 (-51.9601, 88.146) -> (-51.9601, 103.386) projected
  line L9 (-47.6421, 88.146) -> (-51.9601, 88.146) projected
  line L10 (-47.6421, 88.146) -> (-47.6421, 82.304) projected
  line L11 (-47.6421, 82.304) -> (-45.1021, 82.304) projected
  line L12 (-45.1021, 88.146) -> (-45.1021, 82.304) projected
  line L13 (-47.6421, 82.304) -> (-47.7421, 82.304)
  line L14 (-47.7421, 82.304) -> (-47.7421, 82.204)
  line L15 (-47.7421, 82.204) -> (-47.7421, 84.704)
  line L16 (-47.7421, 84.704) -> (-50.2421, 84.704)
  line L17 (-47.7421, 82.204) -> (-45.1021, 82.204)
  line L18 (-45.1021, 82.204) -> (-45.0021, 82.204)
  line L19 (-45.0021, 82.204) -> (-45.0021, 84.704)
  line L20 (-45.0021, 84.704) -> (-42.5021, 84.704)
  line L21 (-42.5021, 84.704) -> (-42.5021, 79.796)
  line L22 (-46.442, 79.796) -> (-38.902, 79.796) projected
  line L23 (-50.2421, 84.704) -> (-50.2421, 79.796)
  line L24 (-50.2421, 79.796) -> (-46.442, 79.796)
  point P0 (0, 0)
  dimension "d136" = 0.1
  dimension "d137" = 0.1
  dimension "d138" = 2.5
  dimension "d139" = 2.5
  dimension "d140" = 0.1
  dimension "d141" = 2.5
extrude "Extrusion35" add sketch "Sketch37" along normal blind 40.894 contours L14 L17 L18 L19 L20 L21 L22 L24 L23 L16 L15
extrude "Extrusion36" cut sketch "Sketch36" against normal blind 5.08 contours L7 L6 L13 L8 L0 | L17 L9 L6 L3 L5 L0
sketch "Sketch38" plane through (0, -2.54, 0) normal (0, -1, 0) x (1, 0, 0)
  line L0 (-73.7193, 68.8881) -> (-54.2193, 68.8881) projected
  line L1 (-57.158, 64.3) -> (-57.158, 69.372) projected
  line L2 (-70.366, 64.3) -> (-70.366, 41.44) projected
  line L3 (-57.158, 68.8881) -> (-70.366, 68.8881)
  line L4 (-70.366, 68.8881) -> (-70.366, 65.8881)
  line L5 (-70.366, 65.8881) -> (-57.158, 65.8881)
  line L6 (-57.158, 65.8881) -> (-57.158, 68.8881)
  point P0 (0, 0)
  dimension "d146" = 3
extrude "Extrusion37" add sketch "Sketch38" along normal blind 21.59
sketch "Sketch39" plane through (0, 0, 0) normal (0, -1, 0) x (1, 0, 0)
  line L0 (-67.2443, -4.7119) -> (-60.6943, -4.7119) projected
  line L1 (-70.366, 36.368) -> (-70.366, 41.44) projected
  line L2 (-70.366, 36.368) -> (-70.366, 5.888)
  line L3 (-70.366, 5.888) -> (-57.158, 5.888)
  line L4 (-70.366, 5.888) -> (-57.158, 5.888)
  line L5 (-57.158, 5.888) -> (-57.158, 8.888)
  line L6 (-57.158, 8.888) -> (-70.366, 8.888)
  line L7 (-70.366, 8.888) -> (-70.366, 5.888)
  point P0 (0, 0)
  dimension "d149" = 30.48
  dimension "d150" = 3
extrude "Extrusion38" add sketch "Sketch39" along normal blind 27.94
sketch "Sketch40" plane through (-57.158, 0, 5.888) normal (0, 0, -1) x (-1, 0, 0)
  circle A0 centre (6.8113, -17.72) radius 3.275 projected
  circle A1 centre (6.8113, -17.72) radius 3.556
  point P0 (-57.158, 0)
  dimension "d153" = 7.112
extrude "Extrusion39" cut sketch "Sketch40" against normal blind 76.2 contours A0 | A1
sketch "Sketch41" plane through (-59.182, -27.002, 4.25) normal (-1, 0, 0) x (0, 0, 1)
  line L0 (-25.4, 3) -> (-38.1, 3) projected
  line L1 (-38.1, 3) -> (-38.1, 0) projected
  line L2 (0, 0) -> (-38.1, 0) projected
  line L3 (0, 27.002) -> (0, 0) projected
  line L4 (-17.78, 27.002) -> (0, 27.002) projected
  line L5 (-17.78, 8.54) -> (-17.78, 27.002) projected
  line L6 (-38.1, 8.54) -> (-17.78, 8.54) projected
  line L7 (-38.1, 5.54) -> (-38.1, 8.54) projected
  line L8 (-38.1, 5.54) -> (-25.4, 5.54) projected
  line L9 (-25.4, 5.54) -> (-25.4, 3) projected
  point P0 (-4.25, 27.002)
sketch "Sketch42" plane through (0, 0, 0) normal (0, -1, 0) x (1, 0, 0)
  line L0 (-70.366, 5.888) -> (-70.366, 8.888) projected
  line L1 (-70.366, 8.888) -> (-57.158, 8.888) projected
  line L2 (-57.158, 8.888) -> (-57.158, 5.888) projected
  line L3 (-57.158, 5.888) -> (-70.366, 5.888) projected
  line L4 (-24.1, 88.65) -> (-24.1, 109.728) projected
  line L5 (-24.1, 109.728) -> (-26.1001, 109.728) projected
  line L6 (-26.1001, 109.728) -> (-26.1001, 86.868) projected
  line L7 (-26.1001, 86.868) -> (-34.1001, 86.868) projected
  line L8 (-34.1001, 86.868) -> (-34.1001, 109.728) projected
  line L9 (-34.1001, 109.728) -> (-28.1, 109.728) projected
  line L10 (-28.1, 109.728) -> (-28.1, 111.3) projected
  line L11 (-28.1, 111.3) -> (-52.1, 111.3) projected
  line L12 (-52.1, 111.3) -> (-52.1, 95.766) projected
  line L13 (-52.1, 95.766) -> (-48.9601, 95.766) projected
  line L14 (-48.9601, 95.766) -> (-48.9601, 86.868) projected
  line L15 (-48.9601, 86.868) -> (-53.9601, 86.868) projected
  line L16 (-53.9601, 86.868) -> (-53.9601, 88.65) projected
  line L17 (-53.9601, 88.65) -> (-68.5, 88.65) projected
  line L18 (-68.5, 88.65) -> (-68.5, 119.3) projected
  line L19 (-68.5, 119.3) -> (-81.2, 119.3) projected
  line L20 (-81.2, 119.3) -> (-81.2, 93.9) projected
  line L21 (-81.2, 93.9) -> (-78.2, 93.9) projected
  line L22 (-78.2, 93.9) -> (-78.2, 81.2) projected
  line L23 (-78.2, 81.2) -> (-81.2, 81.2) projected
  line L24 (-81.2, 81.2) -> (-81.2, 38.1) projected
  line L25 (-81.2, 38.1) -> (-78.2, 38.1) projected
  line L26 (-78.2, 38.1) -> (-78.2, 25.4) projected
  line L27 (-78.2, 25.4) -> (-81.2, 25.4) projected
  line L28 (-81.2, 25.4) -> (-81.2, 0) projected
  line L29 (-81.2, 0) -> (-76.2, 0) projected
  arc A0 (-76.2, 0) -> (0, 0) centre (-38.1, 0) ccw projected
  line L30 (0, 0) -> (5, 0) projected
  line L31 (5, 0) -> (5, 25.4) projected
  line L32 (5, 25.4) -> (2, 25.4) projected
  line L33 (2, 25.4) -> (2, 38.1) projected
  line L34 (2, 38.1) -> (5, 38.1) projected
  line L35 (5, 38.1) -> (5, 81.2) projected
  line L36 (5, 81.2) -> (2, 81.2) projected
  line L37 (2, 81.2) -> (2, 93.9) projected
  line L38 (2, 93.9) -> (5, 93.9) projected
  line L39 (5, 93.9) -> (5, 119.3) projected
  line L40 (5, 119.3) -> (-7.7, 119.3) projected
  line L41 (-7.7, 119.3) -> (-7.7, 88.65) projected
  line L42 (-7.7, 88.65) -> (-5.7555, 88.65) projected
  line L43 (-5.7555, 88.65) -> (-5.7555, 85.65) projected
  line L44 (-5.7555, 85.65) -> (-20.7555, 85.65) projected
  line L45 (-20.7555, 85.65) -> (-20.7555, 88.65) projected
  line L46 (-20.7555, 88.65) -> (-24.1, 88.65) projected
  line L47 (-27.178, -13.53) -> (-59.182, -13.53) projected
  line L48 (-59.182, -13.53) -> (-59.182, 4.25) projected
  line L49 (-59.182, 4.25) -> (-27.178, 4.25) projected
  line L50 (-27.178, 4.25) -> (-27.178, -13.53) projected
  line L51 (-46.442, 79.796) -> (-50.2421, 79.796) projected
  line L52 (-50.2421, 79.796) -> (-50.2421, 84.704) projected
  line L53 (-50.2421, 84.704) -> (-47.7421, 84.704) projected
  line L54 (-47.7421, 84.704) -> (-47.7421, 82.204) projected
  line L55 (-47.7421, 82.204) -> (-45.0021, 82.204) projected
  line L56 (-45.0021, 82.204) -> (-45.0021, 84.704) projected
  line L57 (-45.0021, 84.704) -> (-42.5021, 84.704) projected
  line L58 (-42.5021, 84.704) -> (-42.5021, 79.796) projected
  line L59 (-42.5021, 79.796) -> (-38.902, 79.796) projected
  line L60 (-38.902, 79.796) -> (-38.902, 79.55) projected
  line L61 (-38.902, 79.55) -> (-30.825, 79.55) projected
  line L62 (-30.825, 79.55) -> (-30.825, 76.55) projected
  line L63 (-30.825, 76.55) -> (-46.442, 76.55) projected
  line L64 (-46.442, 76.55) -> (-46.442, 79.796) projected
  circle A1 centre (-38.1, -27.5) radius 5 projected
  line L65 (-70.366, 36.368) -> (-70.366, 41.44) projected
  line L66 (-70.366, 41.44) -> (-76.2, 41.44) projected
  line L67 (-76.2, 41.44) -> (-76.2, 64.3) projected
  line L68 (-76.2, 64.3) -> (-72.382, 64.3) projected
  line L69 (-72.382, 64.3) -> (-72.382, 72.555) projected
  line L70 (-72.382, 72.555) -> (-70.366, 72.555) projected
  line L71 (-70.366, 72.555) -> (-70.366, 69.372) projected
  line L72 (-70.366, 69.372) -> (-60.698, 69.372) projected
  line L73 (-60.698, 69.372) -> (-57.158, 69.372) projected
  line L74 (-57.158, 69.372) -> (-57.158, 64.3) projected
  line L75 (-57.158, 64.3) -> (-49.26, 64.3) projected
  line L76 (-49.26, 64.3) -> (-49.26, 73.015) projected
  line L77 (-49.26, 73.015) -> (-27.94, 73.015) projected
  line L78 (-27.94, 73.015) -> (-27.94, 69.015) projected
  line L79 (-27.94, 69.015) -> (-25.7555, 69.015) projected
  line L80 (-25.7555, 69.015) -> (-25.7555, 42.885) projected
  line L81 (-25.7555, 42.885) -> (-27.94, 42.885) projected
  line L82 (-27.94, 42.885) -> (-49.26, 42.885) projected
  line L83 (-49.26, 42.885) -> (-49.26, 51.6) projected
  line L84 (-49.26, 51.6) -> (-53.34, 51.6) projected
  line L85 (-53.34, 51.6) -> (-53.34, 41.44) projected
  line L86 (-53.34, 41.44) -> (-57.158, 41.44) projected
  line L87 (-57.158, 41.44) -> (-57.158, 36.368) projected
  line L88 (-57.158, 36.368) -> (-60.698, 36.368) projected
  line L89 (-60.698, 36.368) -> (-70.366, 36.368) projected
  line L90 (5, 4.25) -> (-81.2, 4.25)
  line L91 (-81.2, 4.25) -> (-81.2, -51.7211)
  line L92 (-81.2, -51.7211) -> (5, -51.7211)
  line L93 (5, -51.7211) -> (5, 4.25)
  line L94 (5, 4.25) -> (-101.7658, 4.25)
  line L95 (-101.7658, 4.25) -> (-101.7658, 178.715)
  line L96 (-101.7658, 178.715) -> (5, 178.715)
  line L97 (5, 178.715) -> (5, 4.25)
extrude "Extrusion41" cut sketch "Sketch42" along normal mid plane 5638.8 contours L0 L1 L2 L3 | L46 L45 L44 L43 L42 L41 L40 L39 L38 L37 L36 L35 L34 L33 L32 L31 L90 L49 L28 L27 L26 L25 L24 L23 L22 L21 L20 L19 L18 L17 L16 L15 L14 L13 L12 L11 L10 L9 L8 L7 L6 L5 L4 | L4 L5 L6 L7 L8 L9 L10 L11 L12 L13 L14 L15 L16 L17 L18 L19 L20 L21 L22 L23 L24 L25 L26 L27 L28 L94 L95 L96 L97 L40 L41 L42 L43 L44 L45 L46 | L97 L36 L37 L38 | L97 L32 L33 L34 | L51 L52 L53 L54 L55 L56 L57 L58 L59 L60 L61 L62 L63 L64 | L65 L66 L67 L68 L69 L70 L71 L72 L73 L74 L75 L76 L77 L78 L79 L80 L81 L82 L83 L84 L85 L86 L87 L88 L89
sketch "Sketch43" plane through (0, 5, 0) normal (0, 1, 0) x (1, 0, 0)
  line L0 (-50.8, -4.25) -> (-81.2, -4.25) projected
  line L1 (-81.2, -4.25) -> (-81.2, -25.4) projected
  line L2 (-81.2, -25.4) -> (-78.2, -25.4) projected
  line L3 (-78.2, -25.4) -> (-78.2, -38.1) projected
  line L4 (-78.2, -38.1) -> (-81.2, -38.1) projected
  line L5 (-81.2, -38.1) -> (-81.2, -81.2) projected
  line L6 (-81.2, -81.2) -> (-78.2, -81.2) projected
  line L7 (-78.2, -81.2) -> (-78.2, -93.9) projected
  line L8 (-78.2, -93.9) -> (-81.2, -93.9) projected
  line L9 (-81.2, -93.9) -> (-81.2, -119.3) projected
  line L10 (-81.2, -119.3) -> (-68.5, -119.3) projected
  line L11 (-68.5, -119.3) -> (-68.5, -88.65) projected
  line L12 (-68.5, -88.65) -> (-52.1, -88.65) projected
  line L13 (-52.1, -88.65) -> (-52.1, -119.3) projected
  line L14 (-52.1, -119.3) -> (-24.1, -119.3) projected
  line L15 (-24.1, -119.3) -> (-24.1, -88.65) projected
  line L16 (-24.1, -88.65) -> (-7.7, -88.65) projected
  line L17 (-7.7, -88.65) -> (-7.7, -119.3) projected
  line L18 (-7.7, -119.3) -> (5, -119.3) projected
  line L19 (5, -119.3) -> (5, -93.9) projected
  line L20 (5, -93.9) -> (2, -93.9) projected
  line L21 (2, -93.9) -> (2, -81.2) projected
  line L22 (2, -81.2) -> (5, -81.2) projected
  line L23 (5, -81.2) -> (5, -38.1) projected
  line L24 (5, -38.1) -> (2, -38.1) projected
  line L25 (2, -38.1) -> (2, -25.4) projected
  line L26 (2, -25.4) -> (5, -25.4) projected
  line L27 (5, -25.4) -> (5, -4.25) projected
  line L28 (-53.34, -51.6) -> (-49.26, -51.6) projected
  line L29 (-49.26, -51.6) -> (-49.26, -42.885) projected
  line L30 (-49.26, -42.885) -> (-27.94, -42.885) projected
  line L31 (-27.94, -42.885) -> (-27.94, -73.015) projected
  line L32 (-27.94, -73.015) -> (-49.26, -73.015) projected
  line L33 (-49.26, -73.015) -> (-49.26, -64.3) projected
  line L34 (-49.26, -64.3) -> (-57.158, -64.3) projected
  line L35 (-57.158, -64.3) -> (-57.158, -69.372) projected
  line L36 (-57.158, -69.372) -> (-60.698, -69.372) projected
  line L37 (-60.698, -69.372) -> (-60.698, -64.3) projected
  line L38 (-60.698, -64.3) -> (-70.366, -64.3) projected
  line L39 (-70.366, -64.3) -> (-70.366, -72.555) projected
  line L40 (-70.366, -72.555) -> (-72.382, -72.555) projected
  line L41 (-72.382, -72.555) -> (-72.382, -64.3) projected
  line L42 (-72.382, -64.3) -> (-76.2, -64.3) projected
  line L43 (-76.2, -64.3) -> (-76.2, -41.44) projected
  line L44 (-76.2, -41.44) -> (-60.698, -41.44) projected
  line L45 (-60.698, -41.44) -> (-60.698, -36.368) projected
  line L46 (-60.698, -36.368) -> (-57.158, -36.368) projected
  line L47 (-57.158, -36.368) -> (-57.158, -41.44) projected
  line L48 (-57.158, -41.44) -> (-53.34, -41.44) projected
  line L49 (-53.34, -41.44) -> (-53.34, -51.6) projected
  line L50 (-36.2, -4.25) -> (-40, -4.25) projected
  line L51 (-38.1, -4.25) -> (-50.8, -4.25)
  line L52 (-50.8, -4.25) -> (-25.4, -4.25)
  line L53 (-50.8, -4.25) -> (-25.4, -4.25)
  line L54 (-25.4, -4.25) -> (-25.4, -31.75)
  line L55 (-25.4, -31.75) -> (-50.8, -31.75)
  line L56 (-50.8, -31.75) -> (-50.8, -4.25)
  line L57 (-50.8, -31.75) -> (-50.8, -4.25) projected
  line L58 (5, -4.25) -> (-25.15, -4.25) projected
  line L59 (-25.15, -4.25) -> (-25.15, -32) projected
  line L60 (-25.15, -32) -> (-51.05, -32) projected
  line L61 (-51.05, -32) -> (-51.05, -31.75) projected
  line L62 (-51.05, -31.75) -> (-50.8, -31.75) projected
  point P0 (0, 0)
  dimension "d160" = 12.7
  dimension "d161" = 25.4
extrude "Extrusion42" add sketch "Sketch43" against normal blind 5.08 contours L51 L50 L52 L54 L55 L56
sketch "Sketch44" plane through (-81.2, 0, 4.25) normal (0, 0, 1) x (1, 0, 0)
  arc A0 (45, -23.375) -> (41.2, -23.375) centre (43.1, -23.375) ccw projected
  circle A1 centre (43.1, -23.375) radius 2.54
  line L0 (41.2, -27.002) -> (22.018, -27.002) projected
  line L1 (45.64, -23.375) -> (40.56, -23.375)
  line L2 (40.56, -23.375) -> (40.56, -27.002)
  line L3 (40.56, -27.002) -> (45.64, -27.002)
  line L4 (45.64, -27.002) -> (45.64, -23.375)
  point P0 (81.2, 0)
  dimension "d164" = 5.08
extrude "Extrusion43" cut sketch "Sketch44" against normal blind 127
sketch "Sketch45" plane through (-43.18, -27.002, -27.5) normal (0, -1, 0) x (1, 0, 0)
  line L0 (2.54, 13.97) -> (2.54, 31.75) projected
  line L1 (2.54, 31.75) -> (-16.002, 31.75) projected
  line L2 (-16.002, 31.75) -> (-16.002, -6.35) projected
  line L3 (-16.002, -6.35) -> (-11.43, -6.35) projected
  line L4 (-11.43, -6.35) -> (-11.43, 13.97) projected
  line L5 (-11.43, 13.97) -> (2.54, 13.97) projected
  line L6 (7.62, 31.75) -> (7.62, 13.97) projected
  line L7 (7.62, 13.97) -> (11.43, 13.97) projected
  line L8 (11.43, 13.97) -> (11.43, -6.35) projected
  line L9 (11.43, -6.35) -> (16.002, -6.35) projected
  line L10 (16.002, -6.35) -> (16.002, 31.75) projected
  line L11 (16.002, 31.75) -> (7.62, 31.75) projected
  point P0 (43.18, 27.5)
extrude "Extrusion44" add sketch "Sketch45" along normal blind 1
sketch "Sketch46" plane through (-59.182, 0, -13.53) normal (-1, 0, 0) x (0, 0, 1)
  line L0 (-7.62, -24.002) -> (0, -24.002) projected
  line L1 (-20.32, -24.002) -> (-20.32, -28.002) projected
  line L2 (-7.62, -24.002) -> (-20.32, -24.002)
  line L3 (-20.32, -24.002) -> (-20.32, -25.002)
  line L4 (-20.32, -25.002) -> (-7.62, -25.002)
  line L5 (-7.62, -25.002) -> (-7.62, -24.002)
  point P0 (13.53, 0)
  dimension "d169" = 1
extrude "Extrusion45" cut sketch "Sketch46" against normal blind 2819.4
sketch "Sketch47" plane through (0, 5, 0) normal (0, 1, 0) x (1, 0, 0)
  circle A0 centre (-38.1, 0) radius 2.5 projected
  circle A1 centre (-38.1, 0) radius 1.75
  point P0 (0, 0)
  dimension "d172" = 3.5
extrude "Extrusion46" cut sketch "Sketch47" against normal blind 10 contours A1
properties part number "Fronthalf2"
